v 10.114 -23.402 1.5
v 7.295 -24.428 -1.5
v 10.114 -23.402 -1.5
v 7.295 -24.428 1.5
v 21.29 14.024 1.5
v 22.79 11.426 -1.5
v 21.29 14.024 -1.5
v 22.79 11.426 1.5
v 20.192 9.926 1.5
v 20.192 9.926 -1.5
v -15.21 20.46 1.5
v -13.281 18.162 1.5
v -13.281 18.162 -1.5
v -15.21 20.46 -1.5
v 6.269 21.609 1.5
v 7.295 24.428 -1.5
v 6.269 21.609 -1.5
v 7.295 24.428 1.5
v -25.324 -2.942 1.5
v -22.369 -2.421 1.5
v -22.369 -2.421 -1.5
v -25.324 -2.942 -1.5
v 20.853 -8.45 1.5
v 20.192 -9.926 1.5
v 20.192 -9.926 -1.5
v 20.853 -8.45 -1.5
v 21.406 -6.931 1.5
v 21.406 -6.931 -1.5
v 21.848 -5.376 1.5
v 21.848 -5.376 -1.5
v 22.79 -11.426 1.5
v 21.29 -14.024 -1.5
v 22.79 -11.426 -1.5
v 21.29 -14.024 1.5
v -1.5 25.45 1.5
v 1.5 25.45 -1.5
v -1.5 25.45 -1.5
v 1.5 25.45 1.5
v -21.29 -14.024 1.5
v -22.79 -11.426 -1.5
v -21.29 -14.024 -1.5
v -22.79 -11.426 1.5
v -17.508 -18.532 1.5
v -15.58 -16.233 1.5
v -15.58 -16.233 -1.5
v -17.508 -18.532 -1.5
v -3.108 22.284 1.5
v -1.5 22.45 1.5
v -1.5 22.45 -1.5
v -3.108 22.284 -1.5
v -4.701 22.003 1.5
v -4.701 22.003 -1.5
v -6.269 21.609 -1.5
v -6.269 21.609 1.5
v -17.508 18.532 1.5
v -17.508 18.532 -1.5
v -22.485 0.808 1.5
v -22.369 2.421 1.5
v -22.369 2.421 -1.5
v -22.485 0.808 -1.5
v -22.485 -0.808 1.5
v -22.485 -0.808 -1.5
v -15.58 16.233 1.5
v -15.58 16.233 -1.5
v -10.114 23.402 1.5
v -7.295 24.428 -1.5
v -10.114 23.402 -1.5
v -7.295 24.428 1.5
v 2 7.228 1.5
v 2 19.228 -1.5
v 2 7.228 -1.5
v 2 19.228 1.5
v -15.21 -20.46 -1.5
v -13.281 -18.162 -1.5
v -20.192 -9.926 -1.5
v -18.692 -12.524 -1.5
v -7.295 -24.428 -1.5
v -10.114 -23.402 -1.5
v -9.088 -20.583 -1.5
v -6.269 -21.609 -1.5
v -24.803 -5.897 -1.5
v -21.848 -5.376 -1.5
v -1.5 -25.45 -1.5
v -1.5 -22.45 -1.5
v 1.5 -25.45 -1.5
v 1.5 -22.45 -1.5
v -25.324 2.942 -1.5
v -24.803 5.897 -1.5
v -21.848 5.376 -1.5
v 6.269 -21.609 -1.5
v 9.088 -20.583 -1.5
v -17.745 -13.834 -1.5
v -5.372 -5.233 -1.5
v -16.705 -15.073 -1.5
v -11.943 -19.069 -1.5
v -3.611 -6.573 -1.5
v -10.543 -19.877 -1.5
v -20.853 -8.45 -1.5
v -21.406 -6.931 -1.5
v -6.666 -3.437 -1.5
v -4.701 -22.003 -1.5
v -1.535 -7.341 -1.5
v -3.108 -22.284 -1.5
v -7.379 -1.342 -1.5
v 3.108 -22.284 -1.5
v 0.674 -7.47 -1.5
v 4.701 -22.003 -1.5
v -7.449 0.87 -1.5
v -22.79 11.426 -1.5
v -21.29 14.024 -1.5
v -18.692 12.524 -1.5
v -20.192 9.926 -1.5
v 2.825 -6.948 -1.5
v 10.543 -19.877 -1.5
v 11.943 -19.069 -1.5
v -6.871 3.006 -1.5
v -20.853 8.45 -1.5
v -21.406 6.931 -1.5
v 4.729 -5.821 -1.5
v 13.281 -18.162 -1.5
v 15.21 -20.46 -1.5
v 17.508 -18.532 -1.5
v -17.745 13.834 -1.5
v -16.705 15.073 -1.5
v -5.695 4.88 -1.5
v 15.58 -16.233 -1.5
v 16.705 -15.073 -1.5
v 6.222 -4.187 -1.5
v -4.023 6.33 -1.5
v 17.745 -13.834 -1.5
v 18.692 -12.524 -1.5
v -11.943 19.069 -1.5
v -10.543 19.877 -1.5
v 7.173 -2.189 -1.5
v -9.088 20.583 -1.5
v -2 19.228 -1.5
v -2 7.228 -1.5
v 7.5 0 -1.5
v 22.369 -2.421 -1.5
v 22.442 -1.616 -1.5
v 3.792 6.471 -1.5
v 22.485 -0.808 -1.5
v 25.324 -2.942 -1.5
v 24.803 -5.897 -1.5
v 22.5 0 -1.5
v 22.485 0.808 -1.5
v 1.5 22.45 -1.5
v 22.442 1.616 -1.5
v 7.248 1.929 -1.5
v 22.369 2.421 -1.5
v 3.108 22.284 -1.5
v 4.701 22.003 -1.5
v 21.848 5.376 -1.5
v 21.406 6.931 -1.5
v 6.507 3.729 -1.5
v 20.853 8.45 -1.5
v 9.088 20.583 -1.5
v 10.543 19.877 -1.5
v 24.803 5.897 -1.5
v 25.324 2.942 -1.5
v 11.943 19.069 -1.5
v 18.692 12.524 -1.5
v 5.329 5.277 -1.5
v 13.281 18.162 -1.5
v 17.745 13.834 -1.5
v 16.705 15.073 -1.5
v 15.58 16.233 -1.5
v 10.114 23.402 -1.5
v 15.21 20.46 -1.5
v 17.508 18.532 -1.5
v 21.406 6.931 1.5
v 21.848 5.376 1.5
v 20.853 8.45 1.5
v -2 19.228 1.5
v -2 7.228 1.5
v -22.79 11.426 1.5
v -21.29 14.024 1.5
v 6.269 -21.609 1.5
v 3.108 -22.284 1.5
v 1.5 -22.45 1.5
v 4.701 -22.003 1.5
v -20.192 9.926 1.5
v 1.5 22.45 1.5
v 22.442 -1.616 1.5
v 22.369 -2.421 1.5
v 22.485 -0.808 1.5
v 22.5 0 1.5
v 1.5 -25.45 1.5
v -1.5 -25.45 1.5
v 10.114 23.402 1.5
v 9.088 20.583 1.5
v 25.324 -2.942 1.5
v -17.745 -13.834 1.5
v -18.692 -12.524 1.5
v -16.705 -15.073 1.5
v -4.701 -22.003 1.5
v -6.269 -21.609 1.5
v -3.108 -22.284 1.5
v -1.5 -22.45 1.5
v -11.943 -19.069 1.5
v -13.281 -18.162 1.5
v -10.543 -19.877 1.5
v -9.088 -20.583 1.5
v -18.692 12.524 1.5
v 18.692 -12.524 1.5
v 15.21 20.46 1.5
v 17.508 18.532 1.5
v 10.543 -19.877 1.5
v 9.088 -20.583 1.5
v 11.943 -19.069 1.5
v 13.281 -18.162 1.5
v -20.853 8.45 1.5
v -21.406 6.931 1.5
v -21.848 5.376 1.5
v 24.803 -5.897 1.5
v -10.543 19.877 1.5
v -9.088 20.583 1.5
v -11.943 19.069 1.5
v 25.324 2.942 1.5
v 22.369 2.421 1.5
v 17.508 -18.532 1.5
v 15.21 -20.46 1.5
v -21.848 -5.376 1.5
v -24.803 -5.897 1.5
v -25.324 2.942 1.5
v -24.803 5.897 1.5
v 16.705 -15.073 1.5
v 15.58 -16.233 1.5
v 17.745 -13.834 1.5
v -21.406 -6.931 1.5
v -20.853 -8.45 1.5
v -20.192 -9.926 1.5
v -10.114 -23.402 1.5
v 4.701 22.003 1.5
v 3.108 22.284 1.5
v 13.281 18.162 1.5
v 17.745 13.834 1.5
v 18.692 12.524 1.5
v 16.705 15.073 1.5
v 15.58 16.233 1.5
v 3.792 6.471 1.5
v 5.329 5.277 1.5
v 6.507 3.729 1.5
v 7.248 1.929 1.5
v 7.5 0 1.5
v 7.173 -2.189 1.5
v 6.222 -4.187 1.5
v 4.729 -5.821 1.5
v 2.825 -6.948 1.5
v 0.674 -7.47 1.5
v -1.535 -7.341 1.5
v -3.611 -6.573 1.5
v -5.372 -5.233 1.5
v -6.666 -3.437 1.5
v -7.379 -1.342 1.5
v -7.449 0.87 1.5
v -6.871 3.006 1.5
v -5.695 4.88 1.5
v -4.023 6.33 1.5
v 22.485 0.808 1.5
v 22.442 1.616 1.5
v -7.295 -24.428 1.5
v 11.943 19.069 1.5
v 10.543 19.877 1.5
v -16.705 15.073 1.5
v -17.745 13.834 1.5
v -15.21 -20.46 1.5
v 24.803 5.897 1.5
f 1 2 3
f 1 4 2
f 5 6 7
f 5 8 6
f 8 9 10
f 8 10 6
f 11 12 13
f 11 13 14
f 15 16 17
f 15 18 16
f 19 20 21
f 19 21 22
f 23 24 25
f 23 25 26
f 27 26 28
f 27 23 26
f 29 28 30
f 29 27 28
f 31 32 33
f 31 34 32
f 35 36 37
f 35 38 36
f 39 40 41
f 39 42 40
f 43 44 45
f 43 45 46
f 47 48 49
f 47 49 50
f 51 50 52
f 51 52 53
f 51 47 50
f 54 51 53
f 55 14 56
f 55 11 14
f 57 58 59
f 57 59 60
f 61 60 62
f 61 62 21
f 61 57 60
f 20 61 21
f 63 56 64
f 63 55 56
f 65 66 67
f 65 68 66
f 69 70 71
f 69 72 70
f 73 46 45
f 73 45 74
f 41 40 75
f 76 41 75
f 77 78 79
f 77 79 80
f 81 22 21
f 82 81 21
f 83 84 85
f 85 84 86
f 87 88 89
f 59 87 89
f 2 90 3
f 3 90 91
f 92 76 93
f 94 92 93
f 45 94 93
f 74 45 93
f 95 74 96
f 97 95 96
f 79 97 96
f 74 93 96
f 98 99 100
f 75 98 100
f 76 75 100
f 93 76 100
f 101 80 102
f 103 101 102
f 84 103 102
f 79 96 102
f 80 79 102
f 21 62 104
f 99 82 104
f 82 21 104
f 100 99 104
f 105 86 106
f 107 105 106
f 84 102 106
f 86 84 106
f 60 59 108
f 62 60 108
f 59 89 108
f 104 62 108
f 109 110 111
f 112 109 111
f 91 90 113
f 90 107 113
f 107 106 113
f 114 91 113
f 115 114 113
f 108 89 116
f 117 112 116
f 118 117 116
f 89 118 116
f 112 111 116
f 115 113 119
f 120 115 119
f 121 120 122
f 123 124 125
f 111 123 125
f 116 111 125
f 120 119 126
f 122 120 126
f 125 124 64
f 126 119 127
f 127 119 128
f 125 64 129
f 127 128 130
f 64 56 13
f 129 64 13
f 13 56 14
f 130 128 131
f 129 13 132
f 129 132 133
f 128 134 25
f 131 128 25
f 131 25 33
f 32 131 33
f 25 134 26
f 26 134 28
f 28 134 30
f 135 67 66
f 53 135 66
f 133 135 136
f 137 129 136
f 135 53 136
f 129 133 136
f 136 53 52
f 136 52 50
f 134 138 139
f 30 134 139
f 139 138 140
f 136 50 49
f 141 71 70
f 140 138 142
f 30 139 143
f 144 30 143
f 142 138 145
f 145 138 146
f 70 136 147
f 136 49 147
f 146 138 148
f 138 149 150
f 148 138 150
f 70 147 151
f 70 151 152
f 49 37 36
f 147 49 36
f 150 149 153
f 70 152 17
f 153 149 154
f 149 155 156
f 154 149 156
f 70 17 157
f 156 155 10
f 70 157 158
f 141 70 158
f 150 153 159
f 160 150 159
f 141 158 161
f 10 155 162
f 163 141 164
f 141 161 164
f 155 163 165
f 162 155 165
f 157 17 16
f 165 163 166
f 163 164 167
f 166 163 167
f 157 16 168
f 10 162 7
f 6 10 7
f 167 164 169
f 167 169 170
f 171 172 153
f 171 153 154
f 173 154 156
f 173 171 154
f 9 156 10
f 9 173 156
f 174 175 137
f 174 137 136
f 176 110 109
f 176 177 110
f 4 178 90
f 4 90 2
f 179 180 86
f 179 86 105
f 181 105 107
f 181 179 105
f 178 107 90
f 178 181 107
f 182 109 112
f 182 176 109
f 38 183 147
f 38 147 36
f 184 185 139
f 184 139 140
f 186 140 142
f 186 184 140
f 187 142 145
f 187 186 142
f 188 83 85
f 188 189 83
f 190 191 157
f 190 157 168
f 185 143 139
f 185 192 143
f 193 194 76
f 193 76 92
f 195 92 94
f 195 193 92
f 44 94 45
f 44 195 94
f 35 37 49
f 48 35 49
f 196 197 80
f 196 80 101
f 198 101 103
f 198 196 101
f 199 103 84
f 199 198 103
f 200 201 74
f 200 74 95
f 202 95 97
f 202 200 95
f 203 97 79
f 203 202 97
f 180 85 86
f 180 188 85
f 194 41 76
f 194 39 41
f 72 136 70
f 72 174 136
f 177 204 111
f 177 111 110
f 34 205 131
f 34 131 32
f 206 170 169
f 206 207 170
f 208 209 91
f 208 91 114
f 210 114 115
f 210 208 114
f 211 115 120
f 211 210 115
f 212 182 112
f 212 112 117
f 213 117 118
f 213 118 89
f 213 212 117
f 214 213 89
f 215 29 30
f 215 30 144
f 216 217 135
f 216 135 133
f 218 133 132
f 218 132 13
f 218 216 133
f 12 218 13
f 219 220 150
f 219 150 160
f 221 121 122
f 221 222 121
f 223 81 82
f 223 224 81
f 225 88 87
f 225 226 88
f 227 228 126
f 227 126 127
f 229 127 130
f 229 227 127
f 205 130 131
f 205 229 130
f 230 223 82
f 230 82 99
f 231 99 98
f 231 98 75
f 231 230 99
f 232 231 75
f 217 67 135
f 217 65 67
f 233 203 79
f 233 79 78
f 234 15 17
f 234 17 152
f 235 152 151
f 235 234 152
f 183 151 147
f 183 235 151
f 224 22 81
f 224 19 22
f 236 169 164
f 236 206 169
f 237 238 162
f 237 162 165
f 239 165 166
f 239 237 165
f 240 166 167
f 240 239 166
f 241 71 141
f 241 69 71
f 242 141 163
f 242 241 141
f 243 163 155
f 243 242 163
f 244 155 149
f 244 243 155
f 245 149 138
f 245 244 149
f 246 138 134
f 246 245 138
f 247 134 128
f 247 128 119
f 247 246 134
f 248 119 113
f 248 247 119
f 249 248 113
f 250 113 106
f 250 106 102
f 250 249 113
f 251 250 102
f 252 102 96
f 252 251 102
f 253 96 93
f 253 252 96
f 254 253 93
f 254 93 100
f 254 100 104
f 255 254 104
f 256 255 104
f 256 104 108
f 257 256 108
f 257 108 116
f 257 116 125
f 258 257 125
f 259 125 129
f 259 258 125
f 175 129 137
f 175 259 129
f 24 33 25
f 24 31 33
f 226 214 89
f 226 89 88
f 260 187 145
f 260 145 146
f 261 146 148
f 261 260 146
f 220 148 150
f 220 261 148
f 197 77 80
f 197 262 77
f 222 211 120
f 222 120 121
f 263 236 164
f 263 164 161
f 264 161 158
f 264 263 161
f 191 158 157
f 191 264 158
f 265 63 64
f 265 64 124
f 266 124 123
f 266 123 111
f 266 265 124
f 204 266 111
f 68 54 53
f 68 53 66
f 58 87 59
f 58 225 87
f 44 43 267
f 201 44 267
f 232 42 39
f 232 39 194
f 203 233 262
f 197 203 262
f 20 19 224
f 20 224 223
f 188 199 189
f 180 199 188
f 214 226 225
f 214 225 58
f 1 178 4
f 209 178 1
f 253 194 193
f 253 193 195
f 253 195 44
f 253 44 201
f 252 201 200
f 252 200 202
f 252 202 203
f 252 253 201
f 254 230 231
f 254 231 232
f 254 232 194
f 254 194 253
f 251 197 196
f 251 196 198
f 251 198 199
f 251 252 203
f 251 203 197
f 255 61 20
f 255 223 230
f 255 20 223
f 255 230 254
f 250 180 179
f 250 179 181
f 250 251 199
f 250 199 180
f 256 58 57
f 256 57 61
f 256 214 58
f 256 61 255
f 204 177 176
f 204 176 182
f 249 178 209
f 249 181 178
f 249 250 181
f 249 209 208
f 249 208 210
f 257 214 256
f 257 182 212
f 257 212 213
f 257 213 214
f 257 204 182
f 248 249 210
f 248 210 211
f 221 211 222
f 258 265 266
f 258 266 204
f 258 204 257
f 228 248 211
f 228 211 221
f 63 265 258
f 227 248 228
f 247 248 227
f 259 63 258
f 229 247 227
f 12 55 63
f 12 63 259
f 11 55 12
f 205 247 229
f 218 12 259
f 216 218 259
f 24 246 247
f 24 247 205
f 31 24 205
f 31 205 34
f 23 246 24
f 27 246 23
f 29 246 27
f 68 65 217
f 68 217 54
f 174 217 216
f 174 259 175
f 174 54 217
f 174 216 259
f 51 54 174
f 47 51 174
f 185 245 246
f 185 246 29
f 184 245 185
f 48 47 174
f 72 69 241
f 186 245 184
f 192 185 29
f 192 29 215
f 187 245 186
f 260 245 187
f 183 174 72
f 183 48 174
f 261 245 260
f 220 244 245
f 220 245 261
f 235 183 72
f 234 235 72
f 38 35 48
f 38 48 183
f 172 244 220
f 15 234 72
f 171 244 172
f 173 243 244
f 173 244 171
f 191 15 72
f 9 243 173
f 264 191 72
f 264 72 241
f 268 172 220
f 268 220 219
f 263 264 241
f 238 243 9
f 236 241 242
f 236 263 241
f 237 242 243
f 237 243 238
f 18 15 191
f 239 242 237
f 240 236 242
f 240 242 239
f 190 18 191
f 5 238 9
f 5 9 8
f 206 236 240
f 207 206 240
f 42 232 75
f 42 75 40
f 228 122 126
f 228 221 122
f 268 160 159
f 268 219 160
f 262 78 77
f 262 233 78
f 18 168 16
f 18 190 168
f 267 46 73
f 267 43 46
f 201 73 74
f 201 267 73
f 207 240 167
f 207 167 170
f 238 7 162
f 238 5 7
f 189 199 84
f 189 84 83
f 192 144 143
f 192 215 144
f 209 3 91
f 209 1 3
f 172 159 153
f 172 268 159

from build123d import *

# Parameters (mm, degrees)
BOSS_EXTRUDE1_DEPTH = 1.5
BOSS_EXTRUDE2_DEPTH = 1.5
CIRPATTERN1_COUNT   = 18


with BuildPart() as part:
    # Sketch1 → Boss-Extrude1 (new, symmetric)
    with BuildSketch(Plane.XY):
        with BuildLine():
            ThreePointArc((1.5, 22.449944321), (0, 22.5), (-1.5, 22.449944321))
            ThreePointArc((-1.5, 22.449944321), (-15.370426149, -16.431676725), (22.5, 0))
            ThreePointArc((22.5, 0), (16.431676725, 15.370426149), (1.5, 22.449944321))
        make_face()
        with BuildLine():
            ThreePointArc((7.5, 0), (-4.541475531, -5.968668193), (-2, 7.228416147))
            Line((-2, 7.228416147), (-2, 19.228416147))
            Line((-2, 19.228416147), (2, 19.228416147))
            Line((2, 19.228416147), (2, 7.228416147))
            ThreePointArc((2, 7.228416147), (5.968668193, 4.541475531), (7.5, 0))
        make_face(mode=Mode.SUBTRACT)
    extrude(amount=BOSS_EXTRUDE1_DEPTH, both=True)

    # Sketch1<3> → Boss-Extrude2 (add, symmetric)
    with BuildSketch(Plane.XY):
        with BuildLine():
            Line((-1.5, 25.449944321), (-1.5, 22.449944321))
            ThreePointArc((-1.5, 22.449944321), (0, 22.5), (1.5, 22.449944321))
            Line((1.5, 22.449944321), (1.5, 25.449944321))
            Line((1.5, 25.449944321), (-1.5, 25.449944321))
        make_face()
    boss_extrude2 = extrude(amount=BOSS_EXTRUDE2_DEPTH, both=True)

    # CirPattern1: Boss-Extrude2 ×18 about axis
    cirpattern1_axis = Axis((0, 0, 13.219379373), (0, 0, -1))
    for i in range(1, CIRPATTERN1_COUNT):
        add(boss_extrude2.rotate(cirpattern1_axis, i * 360 / CIRPATTERN1_COUNT))


solid = part.part
